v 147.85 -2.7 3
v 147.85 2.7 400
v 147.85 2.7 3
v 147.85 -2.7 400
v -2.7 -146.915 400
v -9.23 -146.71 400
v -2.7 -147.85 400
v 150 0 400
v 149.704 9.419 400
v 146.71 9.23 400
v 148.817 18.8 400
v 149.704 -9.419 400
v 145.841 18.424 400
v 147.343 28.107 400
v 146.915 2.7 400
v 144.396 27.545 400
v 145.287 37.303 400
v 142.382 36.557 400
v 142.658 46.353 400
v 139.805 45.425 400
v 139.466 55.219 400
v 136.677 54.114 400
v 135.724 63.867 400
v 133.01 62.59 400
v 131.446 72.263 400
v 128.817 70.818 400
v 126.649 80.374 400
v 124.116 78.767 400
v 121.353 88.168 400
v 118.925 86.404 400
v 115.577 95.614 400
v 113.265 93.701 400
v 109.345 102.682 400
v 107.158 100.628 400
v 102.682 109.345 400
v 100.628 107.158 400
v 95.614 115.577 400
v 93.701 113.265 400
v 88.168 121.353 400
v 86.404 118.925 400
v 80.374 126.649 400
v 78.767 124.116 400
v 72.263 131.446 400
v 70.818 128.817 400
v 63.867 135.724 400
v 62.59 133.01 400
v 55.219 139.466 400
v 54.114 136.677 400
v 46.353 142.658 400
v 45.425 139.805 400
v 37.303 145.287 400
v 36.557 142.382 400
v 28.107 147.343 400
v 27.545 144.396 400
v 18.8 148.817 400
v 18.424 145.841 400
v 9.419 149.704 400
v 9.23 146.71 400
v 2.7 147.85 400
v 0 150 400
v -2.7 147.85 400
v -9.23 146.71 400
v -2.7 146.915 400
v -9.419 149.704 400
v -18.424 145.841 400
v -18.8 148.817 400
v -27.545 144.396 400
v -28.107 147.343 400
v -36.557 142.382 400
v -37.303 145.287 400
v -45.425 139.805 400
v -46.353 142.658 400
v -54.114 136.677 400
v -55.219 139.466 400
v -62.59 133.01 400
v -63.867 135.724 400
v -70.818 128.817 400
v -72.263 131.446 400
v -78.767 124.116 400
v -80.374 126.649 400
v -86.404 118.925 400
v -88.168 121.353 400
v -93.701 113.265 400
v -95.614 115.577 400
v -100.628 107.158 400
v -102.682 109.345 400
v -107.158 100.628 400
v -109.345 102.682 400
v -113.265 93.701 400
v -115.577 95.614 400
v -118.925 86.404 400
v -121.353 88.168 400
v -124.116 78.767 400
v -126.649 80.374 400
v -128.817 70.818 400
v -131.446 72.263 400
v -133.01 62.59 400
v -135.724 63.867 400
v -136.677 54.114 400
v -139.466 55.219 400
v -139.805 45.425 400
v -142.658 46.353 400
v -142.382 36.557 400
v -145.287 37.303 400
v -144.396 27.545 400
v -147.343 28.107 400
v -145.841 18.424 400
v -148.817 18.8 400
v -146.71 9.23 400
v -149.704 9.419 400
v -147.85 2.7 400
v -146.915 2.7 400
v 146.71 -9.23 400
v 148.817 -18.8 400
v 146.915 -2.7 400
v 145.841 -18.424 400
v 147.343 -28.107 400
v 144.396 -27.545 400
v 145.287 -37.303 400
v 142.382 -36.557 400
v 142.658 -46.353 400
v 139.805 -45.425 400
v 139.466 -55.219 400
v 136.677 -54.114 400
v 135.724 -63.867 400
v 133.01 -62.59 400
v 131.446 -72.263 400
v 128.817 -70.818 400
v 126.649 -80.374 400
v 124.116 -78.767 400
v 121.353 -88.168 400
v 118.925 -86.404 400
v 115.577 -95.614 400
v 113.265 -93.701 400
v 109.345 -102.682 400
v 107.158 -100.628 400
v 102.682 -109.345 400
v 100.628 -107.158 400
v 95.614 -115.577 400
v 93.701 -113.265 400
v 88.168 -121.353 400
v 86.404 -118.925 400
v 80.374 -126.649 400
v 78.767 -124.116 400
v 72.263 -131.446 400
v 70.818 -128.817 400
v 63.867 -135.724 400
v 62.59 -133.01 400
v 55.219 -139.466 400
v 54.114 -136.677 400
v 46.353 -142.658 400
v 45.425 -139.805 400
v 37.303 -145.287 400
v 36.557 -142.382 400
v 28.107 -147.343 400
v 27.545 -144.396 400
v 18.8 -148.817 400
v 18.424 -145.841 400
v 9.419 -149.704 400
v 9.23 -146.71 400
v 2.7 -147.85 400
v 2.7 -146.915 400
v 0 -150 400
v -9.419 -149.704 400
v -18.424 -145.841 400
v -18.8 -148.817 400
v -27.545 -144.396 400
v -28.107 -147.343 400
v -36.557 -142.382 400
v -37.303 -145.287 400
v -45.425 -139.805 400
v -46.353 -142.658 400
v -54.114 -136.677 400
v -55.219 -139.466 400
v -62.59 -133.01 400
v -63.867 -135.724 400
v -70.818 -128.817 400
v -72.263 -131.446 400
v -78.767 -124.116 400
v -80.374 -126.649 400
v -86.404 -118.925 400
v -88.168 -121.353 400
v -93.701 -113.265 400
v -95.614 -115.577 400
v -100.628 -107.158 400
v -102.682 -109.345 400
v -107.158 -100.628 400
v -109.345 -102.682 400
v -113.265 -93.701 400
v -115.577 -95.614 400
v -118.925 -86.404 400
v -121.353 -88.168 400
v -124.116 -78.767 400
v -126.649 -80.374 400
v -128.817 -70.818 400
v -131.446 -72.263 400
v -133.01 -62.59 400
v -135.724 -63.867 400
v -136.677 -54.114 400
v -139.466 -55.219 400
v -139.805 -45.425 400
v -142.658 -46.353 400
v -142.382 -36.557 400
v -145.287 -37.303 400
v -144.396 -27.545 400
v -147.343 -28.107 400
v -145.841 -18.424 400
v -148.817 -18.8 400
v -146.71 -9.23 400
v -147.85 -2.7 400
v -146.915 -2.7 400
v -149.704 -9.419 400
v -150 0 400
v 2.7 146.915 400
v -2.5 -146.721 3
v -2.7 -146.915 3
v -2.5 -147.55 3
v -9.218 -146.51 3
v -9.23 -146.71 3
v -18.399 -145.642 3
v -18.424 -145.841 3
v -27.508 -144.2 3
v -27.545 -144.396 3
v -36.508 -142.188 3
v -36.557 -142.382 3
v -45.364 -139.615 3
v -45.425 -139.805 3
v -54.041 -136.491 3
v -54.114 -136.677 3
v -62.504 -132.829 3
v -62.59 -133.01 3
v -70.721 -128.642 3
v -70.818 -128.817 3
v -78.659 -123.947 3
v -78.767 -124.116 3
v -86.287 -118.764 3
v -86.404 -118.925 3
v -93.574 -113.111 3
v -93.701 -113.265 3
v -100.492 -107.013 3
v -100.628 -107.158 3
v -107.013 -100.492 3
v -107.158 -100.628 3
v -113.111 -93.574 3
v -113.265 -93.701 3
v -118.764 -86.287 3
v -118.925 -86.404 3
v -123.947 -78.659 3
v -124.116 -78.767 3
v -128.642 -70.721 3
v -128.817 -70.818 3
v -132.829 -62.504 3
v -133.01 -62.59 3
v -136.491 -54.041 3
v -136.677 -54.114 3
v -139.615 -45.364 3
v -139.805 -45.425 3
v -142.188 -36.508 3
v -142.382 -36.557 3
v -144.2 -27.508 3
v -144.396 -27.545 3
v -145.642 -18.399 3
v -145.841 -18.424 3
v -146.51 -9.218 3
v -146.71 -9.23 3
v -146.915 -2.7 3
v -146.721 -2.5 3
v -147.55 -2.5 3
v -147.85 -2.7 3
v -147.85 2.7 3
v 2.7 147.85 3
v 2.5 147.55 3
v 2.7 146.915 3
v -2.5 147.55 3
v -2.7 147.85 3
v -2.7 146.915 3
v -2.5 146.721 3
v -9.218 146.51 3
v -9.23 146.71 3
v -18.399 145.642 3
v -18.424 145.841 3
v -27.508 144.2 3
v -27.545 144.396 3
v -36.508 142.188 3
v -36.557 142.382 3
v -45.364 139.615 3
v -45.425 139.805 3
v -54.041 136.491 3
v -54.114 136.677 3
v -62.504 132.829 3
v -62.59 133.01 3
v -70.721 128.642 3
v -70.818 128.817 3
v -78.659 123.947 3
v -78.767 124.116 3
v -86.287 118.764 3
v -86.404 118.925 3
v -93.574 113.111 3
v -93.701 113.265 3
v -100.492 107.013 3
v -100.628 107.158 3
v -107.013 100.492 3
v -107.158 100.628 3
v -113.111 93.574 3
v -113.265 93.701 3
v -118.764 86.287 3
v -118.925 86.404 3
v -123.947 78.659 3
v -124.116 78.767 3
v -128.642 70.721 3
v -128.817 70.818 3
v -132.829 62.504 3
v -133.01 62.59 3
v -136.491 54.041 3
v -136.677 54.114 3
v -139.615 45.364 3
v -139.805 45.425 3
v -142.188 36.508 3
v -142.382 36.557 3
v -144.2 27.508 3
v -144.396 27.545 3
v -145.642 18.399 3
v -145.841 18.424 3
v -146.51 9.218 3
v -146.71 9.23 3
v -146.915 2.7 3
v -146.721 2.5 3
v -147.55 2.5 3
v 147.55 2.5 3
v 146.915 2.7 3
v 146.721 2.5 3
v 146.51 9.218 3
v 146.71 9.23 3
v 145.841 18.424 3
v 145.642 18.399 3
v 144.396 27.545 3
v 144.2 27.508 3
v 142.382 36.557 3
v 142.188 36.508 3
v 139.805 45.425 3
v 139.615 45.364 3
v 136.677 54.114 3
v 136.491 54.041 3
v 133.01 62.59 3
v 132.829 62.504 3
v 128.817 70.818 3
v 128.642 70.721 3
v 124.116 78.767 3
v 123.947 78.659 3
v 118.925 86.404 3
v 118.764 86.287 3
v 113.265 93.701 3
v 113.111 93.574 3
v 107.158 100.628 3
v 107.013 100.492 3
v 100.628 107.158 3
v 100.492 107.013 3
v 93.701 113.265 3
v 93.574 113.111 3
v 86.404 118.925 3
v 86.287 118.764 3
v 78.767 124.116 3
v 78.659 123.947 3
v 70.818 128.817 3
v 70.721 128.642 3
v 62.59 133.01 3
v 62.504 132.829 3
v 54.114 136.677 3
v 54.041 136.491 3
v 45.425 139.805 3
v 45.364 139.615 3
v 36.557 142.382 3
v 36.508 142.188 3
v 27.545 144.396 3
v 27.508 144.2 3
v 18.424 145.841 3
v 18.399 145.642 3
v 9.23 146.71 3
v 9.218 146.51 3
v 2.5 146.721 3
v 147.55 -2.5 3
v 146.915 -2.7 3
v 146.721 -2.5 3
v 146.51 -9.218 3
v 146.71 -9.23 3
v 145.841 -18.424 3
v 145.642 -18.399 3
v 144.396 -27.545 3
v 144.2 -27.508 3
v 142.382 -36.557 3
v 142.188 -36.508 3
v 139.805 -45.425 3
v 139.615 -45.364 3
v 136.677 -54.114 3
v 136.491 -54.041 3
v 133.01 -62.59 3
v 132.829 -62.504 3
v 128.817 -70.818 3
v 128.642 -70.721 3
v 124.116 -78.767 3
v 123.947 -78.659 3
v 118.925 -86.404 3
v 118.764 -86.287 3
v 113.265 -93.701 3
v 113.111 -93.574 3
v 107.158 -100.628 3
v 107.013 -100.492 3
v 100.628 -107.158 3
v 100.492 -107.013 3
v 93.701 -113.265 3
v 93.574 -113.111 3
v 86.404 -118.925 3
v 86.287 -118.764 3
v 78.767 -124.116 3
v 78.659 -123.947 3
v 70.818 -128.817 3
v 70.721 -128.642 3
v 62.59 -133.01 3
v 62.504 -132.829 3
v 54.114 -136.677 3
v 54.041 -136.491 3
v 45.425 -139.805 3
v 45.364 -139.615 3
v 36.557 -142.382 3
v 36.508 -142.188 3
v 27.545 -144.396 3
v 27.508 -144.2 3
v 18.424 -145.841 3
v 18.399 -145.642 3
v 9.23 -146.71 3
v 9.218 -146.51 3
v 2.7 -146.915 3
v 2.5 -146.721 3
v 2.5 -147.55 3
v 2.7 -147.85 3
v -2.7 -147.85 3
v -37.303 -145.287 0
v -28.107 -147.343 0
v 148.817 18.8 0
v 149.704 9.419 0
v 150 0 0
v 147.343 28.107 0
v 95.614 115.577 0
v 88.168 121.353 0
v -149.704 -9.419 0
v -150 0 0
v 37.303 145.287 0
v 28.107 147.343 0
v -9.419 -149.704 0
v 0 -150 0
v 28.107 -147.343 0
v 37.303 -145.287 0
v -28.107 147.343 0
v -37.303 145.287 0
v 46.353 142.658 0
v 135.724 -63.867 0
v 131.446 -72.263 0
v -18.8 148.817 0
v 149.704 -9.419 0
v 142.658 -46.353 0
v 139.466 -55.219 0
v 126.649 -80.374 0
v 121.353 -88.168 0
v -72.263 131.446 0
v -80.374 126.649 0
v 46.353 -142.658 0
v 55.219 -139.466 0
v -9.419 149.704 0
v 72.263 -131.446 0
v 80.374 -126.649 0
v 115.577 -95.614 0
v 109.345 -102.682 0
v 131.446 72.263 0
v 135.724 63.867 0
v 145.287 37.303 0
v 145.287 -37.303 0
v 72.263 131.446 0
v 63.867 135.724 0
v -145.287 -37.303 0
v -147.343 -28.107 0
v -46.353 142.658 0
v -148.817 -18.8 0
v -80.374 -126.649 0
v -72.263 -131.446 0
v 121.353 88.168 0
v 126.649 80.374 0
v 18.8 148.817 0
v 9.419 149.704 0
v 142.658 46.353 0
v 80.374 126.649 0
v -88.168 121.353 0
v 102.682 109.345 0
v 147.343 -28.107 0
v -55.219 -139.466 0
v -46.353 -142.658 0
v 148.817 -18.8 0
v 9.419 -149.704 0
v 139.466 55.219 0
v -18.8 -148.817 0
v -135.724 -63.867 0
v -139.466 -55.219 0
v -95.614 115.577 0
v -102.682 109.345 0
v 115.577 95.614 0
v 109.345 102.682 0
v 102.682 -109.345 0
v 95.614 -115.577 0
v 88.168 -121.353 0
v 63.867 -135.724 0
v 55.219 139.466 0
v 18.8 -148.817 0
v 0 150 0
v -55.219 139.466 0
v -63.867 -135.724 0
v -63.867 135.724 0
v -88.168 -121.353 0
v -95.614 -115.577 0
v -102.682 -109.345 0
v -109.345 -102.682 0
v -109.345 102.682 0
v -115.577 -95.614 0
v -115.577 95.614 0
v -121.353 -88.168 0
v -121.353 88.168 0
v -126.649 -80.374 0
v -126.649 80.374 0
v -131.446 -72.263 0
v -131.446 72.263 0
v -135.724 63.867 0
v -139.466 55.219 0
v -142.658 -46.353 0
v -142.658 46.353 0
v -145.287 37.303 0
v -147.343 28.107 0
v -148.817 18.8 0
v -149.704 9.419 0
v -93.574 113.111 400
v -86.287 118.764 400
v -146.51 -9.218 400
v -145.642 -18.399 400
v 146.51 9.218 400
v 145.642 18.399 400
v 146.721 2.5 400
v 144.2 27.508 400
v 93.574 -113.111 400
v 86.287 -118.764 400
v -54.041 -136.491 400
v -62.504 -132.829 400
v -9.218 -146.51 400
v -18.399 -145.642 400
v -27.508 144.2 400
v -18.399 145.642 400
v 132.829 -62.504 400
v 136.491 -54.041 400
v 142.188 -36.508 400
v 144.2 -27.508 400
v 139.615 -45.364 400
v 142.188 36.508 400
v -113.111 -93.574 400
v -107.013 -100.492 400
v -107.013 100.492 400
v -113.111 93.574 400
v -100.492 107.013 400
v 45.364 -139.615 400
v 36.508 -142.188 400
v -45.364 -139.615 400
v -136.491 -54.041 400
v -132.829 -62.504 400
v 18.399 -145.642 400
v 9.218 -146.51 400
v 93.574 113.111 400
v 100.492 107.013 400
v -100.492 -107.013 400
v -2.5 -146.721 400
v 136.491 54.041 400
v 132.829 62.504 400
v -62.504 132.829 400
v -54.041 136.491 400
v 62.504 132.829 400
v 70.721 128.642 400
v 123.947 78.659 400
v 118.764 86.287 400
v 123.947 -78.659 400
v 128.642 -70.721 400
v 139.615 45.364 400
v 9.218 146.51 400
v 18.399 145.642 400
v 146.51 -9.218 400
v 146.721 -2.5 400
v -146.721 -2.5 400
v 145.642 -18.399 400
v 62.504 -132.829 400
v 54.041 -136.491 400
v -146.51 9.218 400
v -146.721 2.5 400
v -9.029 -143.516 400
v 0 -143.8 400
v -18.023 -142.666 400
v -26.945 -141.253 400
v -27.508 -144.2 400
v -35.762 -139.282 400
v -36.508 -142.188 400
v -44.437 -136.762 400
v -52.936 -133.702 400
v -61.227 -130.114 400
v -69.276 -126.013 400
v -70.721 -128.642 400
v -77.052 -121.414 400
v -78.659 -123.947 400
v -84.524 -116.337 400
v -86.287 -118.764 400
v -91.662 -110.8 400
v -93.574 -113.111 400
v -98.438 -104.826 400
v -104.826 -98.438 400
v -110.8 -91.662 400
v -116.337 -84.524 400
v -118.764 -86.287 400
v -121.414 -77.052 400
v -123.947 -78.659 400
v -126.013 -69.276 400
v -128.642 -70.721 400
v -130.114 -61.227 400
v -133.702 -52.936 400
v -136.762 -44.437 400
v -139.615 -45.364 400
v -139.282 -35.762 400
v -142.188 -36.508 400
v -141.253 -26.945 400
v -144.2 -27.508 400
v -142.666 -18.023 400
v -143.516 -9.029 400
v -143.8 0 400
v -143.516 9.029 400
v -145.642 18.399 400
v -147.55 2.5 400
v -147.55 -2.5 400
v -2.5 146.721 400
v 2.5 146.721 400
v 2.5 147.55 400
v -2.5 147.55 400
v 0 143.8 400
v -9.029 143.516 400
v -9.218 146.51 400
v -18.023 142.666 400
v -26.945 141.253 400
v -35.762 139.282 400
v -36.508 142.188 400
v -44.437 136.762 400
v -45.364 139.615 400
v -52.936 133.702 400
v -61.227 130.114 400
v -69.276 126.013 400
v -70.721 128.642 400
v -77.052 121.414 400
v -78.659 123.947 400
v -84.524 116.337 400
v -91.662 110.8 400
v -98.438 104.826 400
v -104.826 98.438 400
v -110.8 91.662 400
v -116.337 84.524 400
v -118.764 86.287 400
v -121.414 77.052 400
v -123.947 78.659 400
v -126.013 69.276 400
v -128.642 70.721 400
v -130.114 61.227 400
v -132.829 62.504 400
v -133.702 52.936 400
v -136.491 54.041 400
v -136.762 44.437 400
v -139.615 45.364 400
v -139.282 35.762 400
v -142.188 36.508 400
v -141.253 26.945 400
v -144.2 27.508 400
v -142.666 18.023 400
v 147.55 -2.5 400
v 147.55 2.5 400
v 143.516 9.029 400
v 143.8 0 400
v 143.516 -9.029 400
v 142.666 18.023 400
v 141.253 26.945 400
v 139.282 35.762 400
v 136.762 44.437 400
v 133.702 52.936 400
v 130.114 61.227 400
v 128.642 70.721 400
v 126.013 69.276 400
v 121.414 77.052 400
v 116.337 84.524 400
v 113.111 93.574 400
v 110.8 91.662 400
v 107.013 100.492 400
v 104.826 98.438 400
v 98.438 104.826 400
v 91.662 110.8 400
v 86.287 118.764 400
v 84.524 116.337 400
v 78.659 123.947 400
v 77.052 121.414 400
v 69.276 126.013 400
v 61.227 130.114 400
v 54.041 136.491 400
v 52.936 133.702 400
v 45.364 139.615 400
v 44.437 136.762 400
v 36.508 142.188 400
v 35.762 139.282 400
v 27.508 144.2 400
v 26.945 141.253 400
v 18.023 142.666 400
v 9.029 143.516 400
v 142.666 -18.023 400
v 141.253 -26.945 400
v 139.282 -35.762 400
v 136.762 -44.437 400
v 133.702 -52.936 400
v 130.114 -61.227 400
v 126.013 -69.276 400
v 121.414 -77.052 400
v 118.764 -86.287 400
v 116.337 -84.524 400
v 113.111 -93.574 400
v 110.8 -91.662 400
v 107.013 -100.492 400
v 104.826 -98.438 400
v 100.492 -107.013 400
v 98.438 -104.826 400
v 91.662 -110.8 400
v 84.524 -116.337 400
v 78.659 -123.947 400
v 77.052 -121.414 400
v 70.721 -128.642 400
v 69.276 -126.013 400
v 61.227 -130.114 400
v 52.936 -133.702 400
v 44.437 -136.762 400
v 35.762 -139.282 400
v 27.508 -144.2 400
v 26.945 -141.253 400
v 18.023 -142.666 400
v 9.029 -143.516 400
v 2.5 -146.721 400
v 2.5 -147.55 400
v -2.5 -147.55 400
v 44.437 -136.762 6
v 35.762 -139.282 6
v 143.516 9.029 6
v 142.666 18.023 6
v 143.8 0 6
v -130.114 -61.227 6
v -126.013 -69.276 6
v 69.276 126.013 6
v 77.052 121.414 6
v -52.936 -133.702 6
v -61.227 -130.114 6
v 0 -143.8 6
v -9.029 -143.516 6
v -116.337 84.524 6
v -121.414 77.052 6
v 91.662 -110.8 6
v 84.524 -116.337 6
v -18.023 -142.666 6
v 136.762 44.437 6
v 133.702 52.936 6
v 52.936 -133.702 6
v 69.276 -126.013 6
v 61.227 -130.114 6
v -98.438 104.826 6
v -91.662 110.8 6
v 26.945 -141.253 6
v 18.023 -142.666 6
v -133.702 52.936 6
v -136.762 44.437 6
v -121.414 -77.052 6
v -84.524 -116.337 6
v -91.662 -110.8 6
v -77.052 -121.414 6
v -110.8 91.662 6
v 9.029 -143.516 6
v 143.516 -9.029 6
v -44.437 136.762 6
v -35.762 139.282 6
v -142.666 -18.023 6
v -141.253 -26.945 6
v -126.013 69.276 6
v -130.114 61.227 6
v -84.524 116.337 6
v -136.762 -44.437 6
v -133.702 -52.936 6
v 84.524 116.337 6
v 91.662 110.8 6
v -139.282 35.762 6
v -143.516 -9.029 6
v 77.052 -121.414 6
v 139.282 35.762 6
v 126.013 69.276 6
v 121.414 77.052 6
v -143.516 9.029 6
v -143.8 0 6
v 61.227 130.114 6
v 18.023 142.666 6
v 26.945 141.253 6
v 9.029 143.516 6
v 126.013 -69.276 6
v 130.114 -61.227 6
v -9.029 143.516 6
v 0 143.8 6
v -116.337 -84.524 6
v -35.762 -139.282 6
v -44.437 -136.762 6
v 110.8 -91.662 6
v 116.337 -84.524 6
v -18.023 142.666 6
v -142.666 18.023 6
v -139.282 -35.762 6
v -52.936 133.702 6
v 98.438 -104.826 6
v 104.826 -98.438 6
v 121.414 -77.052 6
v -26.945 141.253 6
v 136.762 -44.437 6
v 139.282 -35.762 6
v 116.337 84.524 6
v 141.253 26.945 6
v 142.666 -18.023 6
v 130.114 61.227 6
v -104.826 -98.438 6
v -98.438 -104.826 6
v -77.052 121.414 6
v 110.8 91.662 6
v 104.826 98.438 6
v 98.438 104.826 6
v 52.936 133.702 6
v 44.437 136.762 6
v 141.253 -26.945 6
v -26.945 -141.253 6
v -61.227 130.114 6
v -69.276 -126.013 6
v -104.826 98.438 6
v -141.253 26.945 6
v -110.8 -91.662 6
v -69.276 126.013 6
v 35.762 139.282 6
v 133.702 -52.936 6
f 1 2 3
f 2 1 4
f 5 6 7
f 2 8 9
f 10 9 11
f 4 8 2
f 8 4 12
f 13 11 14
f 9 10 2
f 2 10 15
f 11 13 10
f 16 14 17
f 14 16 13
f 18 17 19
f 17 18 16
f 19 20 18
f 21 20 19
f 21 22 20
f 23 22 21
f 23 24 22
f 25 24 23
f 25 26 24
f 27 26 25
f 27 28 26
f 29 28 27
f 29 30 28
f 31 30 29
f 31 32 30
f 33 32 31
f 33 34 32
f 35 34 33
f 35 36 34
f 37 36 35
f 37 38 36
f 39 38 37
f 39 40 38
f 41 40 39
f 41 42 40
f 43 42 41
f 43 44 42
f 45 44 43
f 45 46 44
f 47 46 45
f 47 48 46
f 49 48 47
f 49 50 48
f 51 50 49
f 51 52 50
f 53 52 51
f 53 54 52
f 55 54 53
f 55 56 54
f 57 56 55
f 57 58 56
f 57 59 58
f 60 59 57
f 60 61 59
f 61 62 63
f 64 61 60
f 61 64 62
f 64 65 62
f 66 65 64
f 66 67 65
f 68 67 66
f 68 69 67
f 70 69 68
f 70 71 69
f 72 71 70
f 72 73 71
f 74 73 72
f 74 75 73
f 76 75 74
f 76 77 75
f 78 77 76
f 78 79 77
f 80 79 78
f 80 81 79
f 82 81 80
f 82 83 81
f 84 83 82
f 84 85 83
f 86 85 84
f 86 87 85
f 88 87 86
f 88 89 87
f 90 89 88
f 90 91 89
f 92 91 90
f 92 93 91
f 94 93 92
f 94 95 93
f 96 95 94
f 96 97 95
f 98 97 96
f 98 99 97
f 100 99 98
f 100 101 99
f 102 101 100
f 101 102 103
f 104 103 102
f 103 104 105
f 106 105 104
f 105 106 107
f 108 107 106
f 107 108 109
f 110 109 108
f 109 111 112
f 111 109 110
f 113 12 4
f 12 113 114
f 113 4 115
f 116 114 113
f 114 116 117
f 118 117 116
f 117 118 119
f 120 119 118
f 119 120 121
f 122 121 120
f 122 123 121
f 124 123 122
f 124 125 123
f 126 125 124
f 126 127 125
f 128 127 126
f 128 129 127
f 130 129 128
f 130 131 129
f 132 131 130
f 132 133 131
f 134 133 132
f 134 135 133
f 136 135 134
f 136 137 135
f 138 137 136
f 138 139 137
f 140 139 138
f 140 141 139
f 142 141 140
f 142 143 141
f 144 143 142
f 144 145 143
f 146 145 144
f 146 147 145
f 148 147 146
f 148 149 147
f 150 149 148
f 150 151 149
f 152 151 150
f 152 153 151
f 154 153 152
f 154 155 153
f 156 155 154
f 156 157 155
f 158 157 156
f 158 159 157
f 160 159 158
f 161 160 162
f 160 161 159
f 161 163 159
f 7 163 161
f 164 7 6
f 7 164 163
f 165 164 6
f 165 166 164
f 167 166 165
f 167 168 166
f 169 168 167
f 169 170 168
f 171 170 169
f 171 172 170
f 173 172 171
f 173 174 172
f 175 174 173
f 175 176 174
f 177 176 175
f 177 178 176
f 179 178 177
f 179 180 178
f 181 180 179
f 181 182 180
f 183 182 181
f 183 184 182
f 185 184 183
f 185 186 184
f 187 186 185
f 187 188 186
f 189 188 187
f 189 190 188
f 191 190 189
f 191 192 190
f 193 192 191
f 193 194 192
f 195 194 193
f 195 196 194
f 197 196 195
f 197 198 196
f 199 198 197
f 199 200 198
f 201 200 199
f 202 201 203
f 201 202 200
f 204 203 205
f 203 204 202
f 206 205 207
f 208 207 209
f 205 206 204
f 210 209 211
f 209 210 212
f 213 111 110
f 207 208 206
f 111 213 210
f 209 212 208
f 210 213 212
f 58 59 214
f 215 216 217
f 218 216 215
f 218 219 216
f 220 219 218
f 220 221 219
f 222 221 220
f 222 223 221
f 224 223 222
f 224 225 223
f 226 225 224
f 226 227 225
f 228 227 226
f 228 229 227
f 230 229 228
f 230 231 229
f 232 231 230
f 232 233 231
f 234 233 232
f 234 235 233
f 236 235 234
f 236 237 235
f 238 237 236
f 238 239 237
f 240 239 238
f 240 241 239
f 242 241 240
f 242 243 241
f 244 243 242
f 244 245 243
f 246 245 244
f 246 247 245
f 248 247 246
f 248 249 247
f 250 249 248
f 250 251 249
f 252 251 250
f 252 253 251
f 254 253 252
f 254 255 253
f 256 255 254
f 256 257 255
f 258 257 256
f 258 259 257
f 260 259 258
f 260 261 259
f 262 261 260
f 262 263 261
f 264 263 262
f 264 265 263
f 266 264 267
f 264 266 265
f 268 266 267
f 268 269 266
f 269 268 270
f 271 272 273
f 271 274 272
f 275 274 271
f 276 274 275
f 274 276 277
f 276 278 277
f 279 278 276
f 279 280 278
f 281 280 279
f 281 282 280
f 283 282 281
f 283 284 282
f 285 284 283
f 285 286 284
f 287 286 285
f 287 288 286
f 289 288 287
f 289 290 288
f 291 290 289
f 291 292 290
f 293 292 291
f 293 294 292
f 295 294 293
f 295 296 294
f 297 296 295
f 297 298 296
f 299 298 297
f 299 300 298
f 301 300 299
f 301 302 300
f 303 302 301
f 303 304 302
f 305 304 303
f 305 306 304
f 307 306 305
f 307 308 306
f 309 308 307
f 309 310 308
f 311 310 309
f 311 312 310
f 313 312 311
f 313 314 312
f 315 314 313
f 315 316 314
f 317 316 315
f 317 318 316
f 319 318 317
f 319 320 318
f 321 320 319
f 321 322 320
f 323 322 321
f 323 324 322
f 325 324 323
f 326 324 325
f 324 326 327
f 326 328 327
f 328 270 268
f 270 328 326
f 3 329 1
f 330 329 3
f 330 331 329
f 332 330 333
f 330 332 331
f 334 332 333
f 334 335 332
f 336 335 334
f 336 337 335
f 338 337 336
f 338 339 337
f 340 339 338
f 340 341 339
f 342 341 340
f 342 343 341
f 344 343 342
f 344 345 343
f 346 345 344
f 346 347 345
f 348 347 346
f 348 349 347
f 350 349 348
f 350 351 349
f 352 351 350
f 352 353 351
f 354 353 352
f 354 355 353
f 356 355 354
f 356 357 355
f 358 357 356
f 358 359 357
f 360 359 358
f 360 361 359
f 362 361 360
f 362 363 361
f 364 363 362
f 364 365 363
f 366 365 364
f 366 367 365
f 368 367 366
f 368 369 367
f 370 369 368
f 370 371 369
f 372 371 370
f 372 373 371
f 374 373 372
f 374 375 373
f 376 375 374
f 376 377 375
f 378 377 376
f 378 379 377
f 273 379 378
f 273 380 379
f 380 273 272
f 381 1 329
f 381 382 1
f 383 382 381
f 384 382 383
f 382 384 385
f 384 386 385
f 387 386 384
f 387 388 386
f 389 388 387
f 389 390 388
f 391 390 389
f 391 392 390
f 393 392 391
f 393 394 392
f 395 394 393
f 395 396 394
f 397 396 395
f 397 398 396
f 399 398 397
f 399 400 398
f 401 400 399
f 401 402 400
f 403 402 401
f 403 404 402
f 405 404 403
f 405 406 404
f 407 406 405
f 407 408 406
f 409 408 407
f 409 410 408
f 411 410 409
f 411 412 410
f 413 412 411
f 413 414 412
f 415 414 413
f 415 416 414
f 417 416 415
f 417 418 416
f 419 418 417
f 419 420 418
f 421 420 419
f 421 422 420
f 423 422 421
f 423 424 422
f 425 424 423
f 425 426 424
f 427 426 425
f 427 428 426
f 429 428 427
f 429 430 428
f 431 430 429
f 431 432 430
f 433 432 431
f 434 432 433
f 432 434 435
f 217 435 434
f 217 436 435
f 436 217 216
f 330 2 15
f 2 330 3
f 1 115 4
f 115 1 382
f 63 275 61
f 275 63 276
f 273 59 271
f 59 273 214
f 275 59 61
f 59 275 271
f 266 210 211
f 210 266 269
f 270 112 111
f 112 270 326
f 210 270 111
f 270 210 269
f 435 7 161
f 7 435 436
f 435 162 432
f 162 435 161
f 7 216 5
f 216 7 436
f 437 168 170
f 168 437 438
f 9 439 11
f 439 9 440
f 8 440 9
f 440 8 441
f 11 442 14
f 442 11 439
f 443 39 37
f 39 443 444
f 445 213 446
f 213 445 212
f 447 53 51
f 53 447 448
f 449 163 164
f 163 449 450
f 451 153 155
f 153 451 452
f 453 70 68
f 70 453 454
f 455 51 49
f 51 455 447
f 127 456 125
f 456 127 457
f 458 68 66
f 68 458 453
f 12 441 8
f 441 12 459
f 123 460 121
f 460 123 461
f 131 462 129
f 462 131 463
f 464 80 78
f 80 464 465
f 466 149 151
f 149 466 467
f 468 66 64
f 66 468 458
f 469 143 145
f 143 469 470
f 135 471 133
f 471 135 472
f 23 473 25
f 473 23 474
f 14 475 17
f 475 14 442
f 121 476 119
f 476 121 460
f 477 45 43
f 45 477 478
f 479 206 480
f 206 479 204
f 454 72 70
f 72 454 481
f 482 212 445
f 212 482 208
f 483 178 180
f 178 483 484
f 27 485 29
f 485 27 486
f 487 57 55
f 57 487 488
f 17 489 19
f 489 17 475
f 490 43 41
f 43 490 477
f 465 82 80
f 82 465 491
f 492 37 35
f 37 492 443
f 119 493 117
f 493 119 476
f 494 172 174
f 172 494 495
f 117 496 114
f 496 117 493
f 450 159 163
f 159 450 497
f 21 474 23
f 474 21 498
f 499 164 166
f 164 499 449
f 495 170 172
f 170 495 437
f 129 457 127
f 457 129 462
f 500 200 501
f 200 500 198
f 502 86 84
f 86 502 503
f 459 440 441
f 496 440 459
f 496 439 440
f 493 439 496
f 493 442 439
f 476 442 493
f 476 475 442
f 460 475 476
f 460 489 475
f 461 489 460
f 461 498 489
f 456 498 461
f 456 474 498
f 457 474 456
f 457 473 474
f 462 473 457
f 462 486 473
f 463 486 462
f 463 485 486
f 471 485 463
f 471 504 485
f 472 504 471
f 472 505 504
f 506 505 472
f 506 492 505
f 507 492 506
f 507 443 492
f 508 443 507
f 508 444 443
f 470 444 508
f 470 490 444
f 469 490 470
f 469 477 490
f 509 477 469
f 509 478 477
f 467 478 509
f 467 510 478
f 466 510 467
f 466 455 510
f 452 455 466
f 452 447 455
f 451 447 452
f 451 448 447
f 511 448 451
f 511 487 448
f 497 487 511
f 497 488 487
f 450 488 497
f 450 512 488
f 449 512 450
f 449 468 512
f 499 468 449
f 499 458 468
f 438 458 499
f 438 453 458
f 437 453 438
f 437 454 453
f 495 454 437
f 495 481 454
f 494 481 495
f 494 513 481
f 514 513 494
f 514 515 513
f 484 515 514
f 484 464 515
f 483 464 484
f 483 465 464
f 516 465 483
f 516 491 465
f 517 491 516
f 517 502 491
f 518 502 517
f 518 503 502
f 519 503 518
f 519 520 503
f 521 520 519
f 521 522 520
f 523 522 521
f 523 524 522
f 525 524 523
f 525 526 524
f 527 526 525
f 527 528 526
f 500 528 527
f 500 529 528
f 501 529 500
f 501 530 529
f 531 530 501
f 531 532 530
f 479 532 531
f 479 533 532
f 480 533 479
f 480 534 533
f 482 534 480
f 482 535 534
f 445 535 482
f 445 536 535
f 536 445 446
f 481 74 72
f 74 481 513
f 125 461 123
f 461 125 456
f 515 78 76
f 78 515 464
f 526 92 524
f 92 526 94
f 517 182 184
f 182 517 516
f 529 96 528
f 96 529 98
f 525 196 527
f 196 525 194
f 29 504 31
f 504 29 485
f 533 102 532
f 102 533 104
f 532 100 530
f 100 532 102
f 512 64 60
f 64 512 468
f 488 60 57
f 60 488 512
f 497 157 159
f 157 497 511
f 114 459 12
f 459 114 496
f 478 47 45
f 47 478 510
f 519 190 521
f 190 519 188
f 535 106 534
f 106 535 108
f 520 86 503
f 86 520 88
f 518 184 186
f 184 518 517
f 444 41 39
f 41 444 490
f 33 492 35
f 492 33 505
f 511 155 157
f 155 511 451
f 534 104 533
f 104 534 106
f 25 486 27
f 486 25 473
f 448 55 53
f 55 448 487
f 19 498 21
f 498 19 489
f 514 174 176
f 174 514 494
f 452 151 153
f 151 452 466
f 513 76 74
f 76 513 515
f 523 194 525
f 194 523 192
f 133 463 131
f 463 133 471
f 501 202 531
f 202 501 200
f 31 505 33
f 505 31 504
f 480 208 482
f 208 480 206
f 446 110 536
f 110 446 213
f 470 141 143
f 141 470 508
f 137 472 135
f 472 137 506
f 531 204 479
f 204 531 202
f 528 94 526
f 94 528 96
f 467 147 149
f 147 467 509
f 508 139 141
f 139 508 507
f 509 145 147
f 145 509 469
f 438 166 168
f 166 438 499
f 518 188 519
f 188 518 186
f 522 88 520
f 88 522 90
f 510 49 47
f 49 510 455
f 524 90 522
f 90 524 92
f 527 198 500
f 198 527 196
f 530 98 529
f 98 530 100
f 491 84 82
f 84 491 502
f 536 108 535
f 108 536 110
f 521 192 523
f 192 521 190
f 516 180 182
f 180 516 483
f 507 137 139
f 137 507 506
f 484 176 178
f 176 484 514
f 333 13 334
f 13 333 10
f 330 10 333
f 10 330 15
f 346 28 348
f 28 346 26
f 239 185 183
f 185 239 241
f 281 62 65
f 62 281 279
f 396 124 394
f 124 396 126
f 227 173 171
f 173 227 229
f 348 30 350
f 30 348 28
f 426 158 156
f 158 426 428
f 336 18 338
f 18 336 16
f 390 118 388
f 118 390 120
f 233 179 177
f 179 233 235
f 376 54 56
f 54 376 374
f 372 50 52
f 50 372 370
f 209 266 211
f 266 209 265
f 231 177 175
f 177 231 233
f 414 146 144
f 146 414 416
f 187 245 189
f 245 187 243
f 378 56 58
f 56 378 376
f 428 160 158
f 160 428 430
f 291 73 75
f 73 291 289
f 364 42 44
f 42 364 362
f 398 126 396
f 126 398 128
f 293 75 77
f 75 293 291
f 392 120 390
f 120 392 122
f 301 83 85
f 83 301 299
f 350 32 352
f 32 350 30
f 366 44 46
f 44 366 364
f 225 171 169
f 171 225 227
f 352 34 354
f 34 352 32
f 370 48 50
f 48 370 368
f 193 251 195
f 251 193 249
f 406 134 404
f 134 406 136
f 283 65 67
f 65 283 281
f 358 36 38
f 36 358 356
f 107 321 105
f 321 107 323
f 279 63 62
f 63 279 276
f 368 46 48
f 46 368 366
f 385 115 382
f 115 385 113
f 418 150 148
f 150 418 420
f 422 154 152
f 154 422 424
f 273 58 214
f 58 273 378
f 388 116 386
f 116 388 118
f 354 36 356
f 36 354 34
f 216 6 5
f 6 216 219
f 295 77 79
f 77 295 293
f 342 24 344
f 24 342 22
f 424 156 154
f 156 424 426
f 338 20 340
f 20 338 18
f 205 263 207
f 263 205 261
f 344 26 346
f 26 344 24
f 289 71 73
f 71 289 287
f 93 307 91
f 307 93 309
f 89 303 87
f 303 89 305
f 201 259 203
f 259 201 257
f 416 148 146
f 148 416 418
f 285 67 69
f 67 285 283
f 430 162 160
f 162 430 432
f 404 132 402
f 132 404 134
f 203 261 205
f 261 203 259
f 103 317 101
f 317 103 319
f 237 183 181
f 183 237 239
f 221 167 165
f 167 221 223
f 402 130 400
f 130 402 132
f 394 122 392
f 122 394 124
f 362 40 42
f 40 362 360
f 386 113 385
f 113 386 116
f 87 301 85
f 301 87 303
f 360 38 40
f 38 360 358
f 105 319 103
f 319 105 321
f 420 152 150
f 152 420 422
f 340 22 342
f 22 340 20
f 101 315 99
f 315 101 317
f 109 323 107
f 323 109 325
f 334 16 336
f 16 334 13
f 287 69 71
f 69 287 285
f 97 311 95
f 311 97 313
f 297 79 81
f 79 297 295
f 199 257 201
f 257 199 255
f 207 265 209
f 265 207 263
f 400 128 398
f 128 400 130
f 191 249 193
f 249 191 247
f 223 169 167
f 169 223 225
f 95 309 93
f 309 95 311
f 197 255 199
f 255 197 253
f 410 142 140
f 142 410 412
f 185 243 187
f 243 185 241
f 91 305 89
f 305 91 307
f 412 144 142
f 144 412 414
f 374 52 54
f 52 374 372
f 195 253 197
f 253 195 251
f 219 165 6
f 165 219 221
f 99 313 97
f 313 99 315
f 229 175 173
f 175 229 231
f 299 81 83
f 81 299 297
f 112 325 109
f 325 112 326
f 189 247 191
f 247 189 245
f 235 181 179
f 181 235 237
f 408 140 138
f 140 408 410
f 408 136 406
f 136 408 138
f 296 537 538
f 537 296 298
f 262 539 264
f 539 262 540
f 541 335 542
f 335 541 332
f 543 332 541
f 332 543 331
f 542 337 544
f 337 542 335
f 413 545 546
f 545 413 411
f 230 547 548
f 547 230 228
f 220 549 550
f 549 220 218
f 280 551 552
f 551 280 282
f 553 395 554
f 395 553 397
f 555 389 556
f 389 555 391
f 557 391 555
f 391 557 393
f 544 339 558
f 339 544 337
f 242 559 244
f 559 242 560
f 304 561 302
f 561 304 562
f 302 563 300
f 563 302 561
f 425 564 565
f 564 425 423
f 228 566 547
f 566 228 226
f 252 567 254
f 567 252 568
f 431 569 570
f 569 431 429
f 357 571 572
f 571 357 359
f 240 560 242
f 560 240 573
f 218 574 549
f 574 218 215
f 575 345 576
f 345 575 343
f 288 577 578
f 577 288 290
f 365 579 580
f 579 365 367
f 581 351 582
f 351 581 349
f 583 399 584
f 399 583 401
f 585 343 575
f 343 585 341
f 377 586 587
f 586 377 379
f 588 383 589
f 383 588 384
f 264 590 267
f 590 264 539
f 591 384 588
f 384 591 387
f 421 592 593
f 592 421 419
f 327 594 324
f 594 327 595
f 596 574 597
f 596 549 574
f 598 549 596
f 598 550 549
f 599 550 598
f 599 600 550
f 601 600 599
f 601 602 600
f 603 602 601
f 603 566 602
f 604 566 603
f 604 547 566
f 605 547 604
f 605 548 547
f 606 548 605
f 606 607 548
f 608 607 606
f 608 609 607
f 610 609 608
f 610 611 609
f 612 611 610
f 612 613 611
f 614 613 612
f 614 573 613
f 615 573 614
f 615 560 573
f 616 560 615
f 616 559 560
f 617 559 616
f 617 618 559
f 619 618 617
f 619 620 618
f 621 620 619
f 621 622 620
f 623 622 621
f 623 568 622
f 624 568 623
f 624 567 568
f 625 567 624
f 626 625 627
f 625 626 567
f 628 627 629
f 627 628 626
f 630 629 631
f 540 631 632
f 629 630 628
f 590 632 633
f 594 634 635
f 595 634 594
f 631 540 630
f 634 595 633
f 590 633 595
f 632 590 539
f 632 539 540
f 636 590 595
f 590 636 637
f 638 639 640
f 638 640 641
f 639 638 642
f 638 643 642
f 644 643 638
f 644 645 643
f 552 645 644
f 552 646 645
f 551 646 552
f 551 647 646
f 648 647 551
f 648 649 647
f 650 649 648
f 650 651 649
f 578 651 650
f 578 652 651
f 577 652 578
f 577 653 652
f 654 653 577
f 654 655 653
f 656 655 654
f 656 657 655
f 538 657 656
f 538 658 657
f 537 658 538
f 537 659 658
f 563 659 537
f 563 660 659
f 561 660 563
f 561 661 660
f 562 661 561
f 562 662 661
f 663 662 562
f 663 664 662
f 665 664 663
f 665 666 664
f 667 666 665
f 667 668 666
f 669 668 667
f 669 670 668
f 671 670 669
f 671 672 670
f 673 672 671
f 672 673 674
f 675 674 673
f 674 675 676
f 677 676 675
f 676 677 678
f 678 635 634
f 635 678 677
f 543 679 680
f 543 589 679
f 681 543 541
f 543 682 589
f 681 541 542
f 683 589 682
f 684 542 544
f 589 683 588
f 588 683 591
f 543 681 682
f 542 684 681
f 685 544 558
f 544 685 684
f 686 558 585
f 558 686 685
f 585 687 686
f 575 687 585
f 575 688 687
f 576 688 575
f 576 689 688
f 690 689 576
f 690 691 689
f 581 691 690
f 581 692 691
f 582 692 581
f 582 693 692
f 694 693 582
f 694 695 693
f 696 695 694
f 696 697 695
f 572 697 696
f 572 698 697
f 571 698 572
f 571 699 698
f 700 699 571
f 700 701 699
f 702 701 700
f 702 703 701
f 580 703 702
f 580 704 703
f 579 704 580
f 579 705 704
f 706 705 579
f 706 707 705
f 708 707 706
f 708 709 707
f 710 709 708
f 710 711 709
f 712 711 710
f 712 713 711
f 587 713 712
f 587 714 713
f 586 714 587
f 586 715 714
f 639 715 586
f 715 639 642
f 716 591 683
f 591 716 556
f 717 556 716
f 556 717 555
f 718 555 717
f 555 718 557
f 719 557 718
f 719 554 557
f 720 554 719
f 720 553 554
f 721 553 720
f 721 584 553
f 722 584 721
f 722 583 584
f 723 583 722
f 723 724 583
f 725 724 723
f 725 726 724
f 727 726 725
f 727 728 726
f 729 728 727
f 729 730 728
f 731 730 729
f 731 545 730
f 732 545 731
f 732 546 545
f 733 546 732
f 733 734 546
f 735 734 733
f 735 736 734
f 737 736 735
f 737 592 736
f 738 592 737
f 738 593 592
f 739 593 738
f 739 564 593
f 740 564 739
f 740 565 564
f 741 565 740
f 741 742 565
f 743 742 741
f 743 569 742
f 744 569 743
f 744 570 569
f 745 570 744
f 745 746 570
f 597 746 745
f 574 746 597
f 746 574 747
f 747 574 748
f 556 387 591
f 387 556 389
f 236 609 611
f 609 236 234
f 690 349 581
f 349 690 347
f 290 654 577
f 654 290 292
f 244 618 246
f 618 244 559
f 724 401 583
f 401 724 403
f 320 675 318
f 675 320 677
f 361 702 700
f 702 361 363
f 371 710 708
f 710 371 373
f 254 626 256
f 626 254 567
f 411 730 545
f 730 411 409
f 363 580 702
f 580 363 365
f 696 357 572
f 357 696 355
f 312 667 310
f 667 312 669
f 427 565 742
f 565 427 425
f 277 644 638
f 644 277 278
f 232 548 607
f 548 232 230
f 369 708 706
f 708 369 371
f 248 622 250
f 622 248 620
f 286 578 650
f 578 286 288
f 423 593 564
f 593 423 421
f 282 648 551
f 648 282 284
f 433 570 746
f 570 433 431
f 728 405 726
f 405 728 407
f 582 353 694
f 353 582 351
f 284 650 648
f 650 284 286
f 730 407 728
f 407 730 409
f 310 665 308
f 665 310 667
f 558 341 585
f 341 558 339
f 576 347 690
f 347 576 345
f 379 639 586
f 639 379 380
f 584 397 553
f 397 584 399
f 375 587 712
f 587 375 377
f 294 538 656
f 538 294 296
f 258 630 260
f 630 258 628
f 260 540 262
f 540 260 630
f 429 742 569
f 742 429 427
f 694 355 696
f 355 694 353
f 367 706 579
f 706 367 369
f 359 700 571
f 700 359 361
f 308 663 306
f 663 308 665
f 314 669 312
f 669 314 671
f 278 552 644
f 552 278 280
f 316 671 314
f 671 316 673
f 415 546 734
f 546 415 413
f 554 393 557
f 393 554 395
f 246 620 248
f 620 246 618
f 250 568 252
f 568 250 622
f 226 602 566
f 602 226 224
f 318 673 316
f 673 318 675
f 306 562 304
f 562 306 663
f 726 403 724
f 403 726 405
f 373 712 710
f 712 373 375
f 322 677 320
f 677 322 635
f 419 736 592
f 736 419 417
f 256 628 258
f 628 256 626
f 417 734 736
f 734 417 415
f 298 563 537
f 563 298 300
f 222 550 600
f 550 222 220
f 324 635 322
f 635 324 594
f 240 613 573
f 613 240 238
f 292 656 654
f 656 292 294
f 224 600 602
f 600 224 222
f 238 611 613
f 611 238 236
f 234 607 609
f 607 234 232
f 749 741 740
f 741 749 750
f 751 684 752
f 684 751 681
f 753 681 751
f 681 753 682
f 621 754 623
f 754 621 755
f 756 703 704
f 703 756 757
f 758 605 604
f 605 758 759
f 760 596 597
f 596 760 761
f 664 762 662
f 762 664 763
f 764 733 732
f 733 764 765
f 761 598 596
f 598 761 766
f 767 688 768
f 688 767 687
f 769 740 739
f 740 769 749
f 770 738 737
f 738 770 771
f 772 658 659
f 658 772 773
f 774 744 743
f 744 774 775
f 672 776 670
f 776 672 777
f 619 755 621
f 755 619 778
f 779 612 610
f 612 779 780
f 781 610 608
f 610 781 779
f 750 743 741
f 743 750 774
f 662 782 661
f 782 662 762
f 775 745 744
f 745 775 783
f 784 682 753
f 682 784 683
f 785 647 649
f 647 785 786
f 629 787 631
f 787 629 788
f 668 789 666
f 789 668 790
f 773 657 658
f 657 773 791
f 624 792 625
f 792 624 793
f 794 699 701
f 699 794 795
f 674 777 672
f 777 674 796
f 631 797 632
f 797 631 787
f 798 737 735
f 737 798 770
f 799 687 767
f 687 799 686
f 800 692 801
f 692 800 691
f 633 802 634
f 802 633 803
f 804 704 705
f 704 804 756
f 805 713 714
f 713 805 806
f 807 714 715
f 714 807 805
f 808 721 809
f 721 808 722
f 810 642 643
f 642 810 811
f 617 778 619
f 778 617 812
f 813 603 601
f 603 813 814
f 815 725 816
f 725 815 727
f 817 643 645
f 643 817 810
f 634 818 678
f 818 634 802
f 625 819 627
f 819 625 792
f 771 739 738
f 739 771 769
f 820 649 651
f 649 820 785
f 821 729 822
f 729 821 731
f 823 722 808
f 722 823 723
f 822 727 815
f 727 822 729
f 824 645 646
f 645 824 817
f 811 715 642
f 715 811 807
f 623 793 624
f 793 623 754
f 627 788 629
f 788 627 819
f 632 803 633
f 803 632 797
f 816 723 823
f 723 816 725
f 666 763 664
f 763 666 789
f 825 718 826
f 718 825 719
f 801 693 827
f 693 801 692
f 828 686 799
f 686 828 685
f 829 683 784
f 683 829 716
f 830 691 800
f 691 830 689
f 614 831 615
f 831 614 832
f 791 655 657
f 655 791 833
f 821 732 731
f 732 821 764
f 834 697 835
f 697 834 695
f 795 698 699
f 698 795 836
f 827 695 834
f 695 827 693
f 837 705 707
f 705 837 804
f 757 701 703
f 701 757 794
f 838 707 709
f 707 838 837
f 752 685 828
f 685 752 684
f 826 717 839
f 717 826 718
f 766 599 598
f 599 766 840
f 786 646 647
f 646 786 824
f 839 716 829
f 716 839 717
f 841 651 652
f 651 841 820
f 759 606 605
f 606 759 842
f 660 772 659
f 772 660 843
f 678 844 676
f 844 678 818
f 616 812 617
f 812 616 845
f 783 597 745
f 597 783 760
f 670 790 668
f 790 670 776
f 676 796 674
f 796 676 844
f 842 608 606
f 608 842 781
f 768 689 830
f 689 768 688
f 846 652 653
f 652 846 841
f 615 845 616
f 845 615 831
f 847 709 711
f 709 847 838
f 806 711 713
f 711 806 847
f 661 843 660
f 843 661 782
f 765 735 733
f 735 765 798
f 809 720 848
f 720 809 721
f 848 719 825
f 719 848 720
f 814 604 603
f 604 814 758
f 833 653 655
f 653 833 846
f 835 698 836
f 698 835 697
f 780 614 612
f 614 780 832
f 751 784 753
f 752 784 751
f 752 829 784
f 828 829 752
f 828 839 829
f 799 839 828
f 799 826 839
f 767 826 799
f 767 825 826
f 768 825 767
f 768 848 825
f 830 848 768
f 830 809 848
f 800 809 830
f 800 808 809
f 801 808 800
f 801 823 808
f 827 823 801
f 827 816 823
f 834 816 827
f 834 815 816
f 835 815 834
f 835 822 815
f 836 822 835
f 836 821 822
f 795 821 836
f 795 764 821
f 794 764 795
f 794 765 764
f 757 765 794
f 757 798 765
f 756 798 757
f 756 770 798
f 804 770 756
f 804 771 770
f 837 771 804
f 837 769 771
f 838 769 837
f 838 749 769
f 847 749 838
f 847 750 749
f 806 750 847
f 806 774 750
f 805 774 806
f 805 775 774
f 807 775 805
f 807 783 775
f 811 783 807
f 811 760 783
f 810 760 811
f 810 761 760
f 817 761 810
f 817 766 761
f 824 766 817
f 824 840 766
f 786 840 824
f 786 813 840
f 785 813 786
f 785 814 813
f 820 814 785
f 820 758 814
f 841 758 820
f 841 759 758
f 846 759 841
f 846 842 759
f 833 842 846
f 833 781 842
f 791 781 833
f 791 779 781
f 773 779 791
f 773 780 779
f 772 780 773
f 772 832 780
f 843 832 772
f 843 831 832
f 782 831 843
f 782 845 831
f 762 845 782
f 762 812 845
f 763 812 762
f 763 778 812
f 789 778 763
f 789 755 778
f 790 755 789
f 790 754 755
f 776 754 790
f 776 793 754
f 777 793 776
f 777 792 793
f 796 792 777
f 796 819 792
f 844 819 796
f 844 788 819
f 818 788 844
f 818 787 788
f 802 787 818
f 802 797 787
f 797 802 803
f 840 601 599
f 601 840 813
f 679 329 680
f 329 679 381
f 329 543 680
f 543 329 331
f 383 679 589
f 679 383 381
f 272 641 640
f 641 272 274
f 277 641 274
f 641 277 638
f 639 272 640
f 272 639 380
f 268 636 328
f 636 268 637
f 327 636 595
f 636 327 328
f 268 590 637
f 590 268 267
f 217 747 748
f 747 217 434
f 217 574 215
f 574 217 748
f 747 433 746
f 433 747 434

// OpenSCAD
// Circular Worm Bin - Nested Cylindrical Design
// Parameters for customization

// Outer shell dimensions
outer_diameter = 300; // mm
outer_height = 400;   // mm
outer_wall_thickness = 3; // mm

// Tolerance between shells
tolerance = 0.2; // mm - adjust based on your printer's accuracy

// Ridge and channel dimensions
ridge_width = 5; // mm
ridge_depth = outer_wall_thickness / 2; // Half the depth of outer shell wall
ridge_count = 4; // Number of ridges/channels around the circumference

// Inner shell dimensions (calculated from outer dimensions and tolerance)
inner_diameter = outer_diameter - 2 * (outer_wall_thickness + tolerance);
inner_height = outer_height - outer_wall_thickness; // Remove tolerance to make tops flush

// Create a single ridge
module ridge(height) {
    translate([inner_diameter/2, 0, height/2])
        cube([ridge_depth, ridge_width, height], center=true);
}

// Create a single channel
module channel(height) {
    // Position the channel on the inside wall of the outer shell
    translate([outer_diameter/2 - outer_wall_thickness, 0, (outer_height + outer_wall_thickness)/2])
        cube([ridge_depth + tolerance, ridge_width + tolerance*2, outer_height - outer_wall_thickness], center=true);
}

// Render the outer shell with channels
module outer_shell() {
    difference() {
        cylinder(h = outer_height, d = outer_diameter, center = false, $fn=100);
        
        // Hollow out the inside
        translate([0, 0, outer_wall_thickness])  // Leave bottom wall thickness
            cylinder(h = outer_height, d = outer_diameter - 2 * outer_wall_thickness, center = false, $fn=100);
        
        // Add channels - make them deeper for visibility
        for (i = [0:ridge_count-1]) {
            angle = i * 360 / ridge_count;
            rotate([0, 0, angle])
                channel(outer_height);
        }
    }
}

// Render the inner shell with ridges
module inner_shell() {
    union() {
        difference() {
            cylinder(h = inner_height, d = inner_diameter, center = false, $fn=100);
            translate([0, 0, outer_wall_thickness])  // Leave bottom wall thickness
                cylinder(h = inner_height, d = inner_diameter - 2 * outer_wall_thickness, center = false, $fn=100);
        }
        
        // Add ridges
        for (i = [0:ridge_count-1]) {
            angle = i * 360 / ridge_count;
            rotate([0, 0, angle])
                ridge(inner_height);
        }
    }
}

// Render both shells
outer_shell();
translate([0, 0, outer_wall_thickness]) // Position inner shell on the bottom of outer shell
    color("LightGreen") inner_shell();

// Add some basic information
echo("Outer shell diameter: ", outer_diameter, "mm");
echo("Inner shell diameter: ", inner_diameter, "mm");
echo("Gap between shells: ", tolerance, "mm");
